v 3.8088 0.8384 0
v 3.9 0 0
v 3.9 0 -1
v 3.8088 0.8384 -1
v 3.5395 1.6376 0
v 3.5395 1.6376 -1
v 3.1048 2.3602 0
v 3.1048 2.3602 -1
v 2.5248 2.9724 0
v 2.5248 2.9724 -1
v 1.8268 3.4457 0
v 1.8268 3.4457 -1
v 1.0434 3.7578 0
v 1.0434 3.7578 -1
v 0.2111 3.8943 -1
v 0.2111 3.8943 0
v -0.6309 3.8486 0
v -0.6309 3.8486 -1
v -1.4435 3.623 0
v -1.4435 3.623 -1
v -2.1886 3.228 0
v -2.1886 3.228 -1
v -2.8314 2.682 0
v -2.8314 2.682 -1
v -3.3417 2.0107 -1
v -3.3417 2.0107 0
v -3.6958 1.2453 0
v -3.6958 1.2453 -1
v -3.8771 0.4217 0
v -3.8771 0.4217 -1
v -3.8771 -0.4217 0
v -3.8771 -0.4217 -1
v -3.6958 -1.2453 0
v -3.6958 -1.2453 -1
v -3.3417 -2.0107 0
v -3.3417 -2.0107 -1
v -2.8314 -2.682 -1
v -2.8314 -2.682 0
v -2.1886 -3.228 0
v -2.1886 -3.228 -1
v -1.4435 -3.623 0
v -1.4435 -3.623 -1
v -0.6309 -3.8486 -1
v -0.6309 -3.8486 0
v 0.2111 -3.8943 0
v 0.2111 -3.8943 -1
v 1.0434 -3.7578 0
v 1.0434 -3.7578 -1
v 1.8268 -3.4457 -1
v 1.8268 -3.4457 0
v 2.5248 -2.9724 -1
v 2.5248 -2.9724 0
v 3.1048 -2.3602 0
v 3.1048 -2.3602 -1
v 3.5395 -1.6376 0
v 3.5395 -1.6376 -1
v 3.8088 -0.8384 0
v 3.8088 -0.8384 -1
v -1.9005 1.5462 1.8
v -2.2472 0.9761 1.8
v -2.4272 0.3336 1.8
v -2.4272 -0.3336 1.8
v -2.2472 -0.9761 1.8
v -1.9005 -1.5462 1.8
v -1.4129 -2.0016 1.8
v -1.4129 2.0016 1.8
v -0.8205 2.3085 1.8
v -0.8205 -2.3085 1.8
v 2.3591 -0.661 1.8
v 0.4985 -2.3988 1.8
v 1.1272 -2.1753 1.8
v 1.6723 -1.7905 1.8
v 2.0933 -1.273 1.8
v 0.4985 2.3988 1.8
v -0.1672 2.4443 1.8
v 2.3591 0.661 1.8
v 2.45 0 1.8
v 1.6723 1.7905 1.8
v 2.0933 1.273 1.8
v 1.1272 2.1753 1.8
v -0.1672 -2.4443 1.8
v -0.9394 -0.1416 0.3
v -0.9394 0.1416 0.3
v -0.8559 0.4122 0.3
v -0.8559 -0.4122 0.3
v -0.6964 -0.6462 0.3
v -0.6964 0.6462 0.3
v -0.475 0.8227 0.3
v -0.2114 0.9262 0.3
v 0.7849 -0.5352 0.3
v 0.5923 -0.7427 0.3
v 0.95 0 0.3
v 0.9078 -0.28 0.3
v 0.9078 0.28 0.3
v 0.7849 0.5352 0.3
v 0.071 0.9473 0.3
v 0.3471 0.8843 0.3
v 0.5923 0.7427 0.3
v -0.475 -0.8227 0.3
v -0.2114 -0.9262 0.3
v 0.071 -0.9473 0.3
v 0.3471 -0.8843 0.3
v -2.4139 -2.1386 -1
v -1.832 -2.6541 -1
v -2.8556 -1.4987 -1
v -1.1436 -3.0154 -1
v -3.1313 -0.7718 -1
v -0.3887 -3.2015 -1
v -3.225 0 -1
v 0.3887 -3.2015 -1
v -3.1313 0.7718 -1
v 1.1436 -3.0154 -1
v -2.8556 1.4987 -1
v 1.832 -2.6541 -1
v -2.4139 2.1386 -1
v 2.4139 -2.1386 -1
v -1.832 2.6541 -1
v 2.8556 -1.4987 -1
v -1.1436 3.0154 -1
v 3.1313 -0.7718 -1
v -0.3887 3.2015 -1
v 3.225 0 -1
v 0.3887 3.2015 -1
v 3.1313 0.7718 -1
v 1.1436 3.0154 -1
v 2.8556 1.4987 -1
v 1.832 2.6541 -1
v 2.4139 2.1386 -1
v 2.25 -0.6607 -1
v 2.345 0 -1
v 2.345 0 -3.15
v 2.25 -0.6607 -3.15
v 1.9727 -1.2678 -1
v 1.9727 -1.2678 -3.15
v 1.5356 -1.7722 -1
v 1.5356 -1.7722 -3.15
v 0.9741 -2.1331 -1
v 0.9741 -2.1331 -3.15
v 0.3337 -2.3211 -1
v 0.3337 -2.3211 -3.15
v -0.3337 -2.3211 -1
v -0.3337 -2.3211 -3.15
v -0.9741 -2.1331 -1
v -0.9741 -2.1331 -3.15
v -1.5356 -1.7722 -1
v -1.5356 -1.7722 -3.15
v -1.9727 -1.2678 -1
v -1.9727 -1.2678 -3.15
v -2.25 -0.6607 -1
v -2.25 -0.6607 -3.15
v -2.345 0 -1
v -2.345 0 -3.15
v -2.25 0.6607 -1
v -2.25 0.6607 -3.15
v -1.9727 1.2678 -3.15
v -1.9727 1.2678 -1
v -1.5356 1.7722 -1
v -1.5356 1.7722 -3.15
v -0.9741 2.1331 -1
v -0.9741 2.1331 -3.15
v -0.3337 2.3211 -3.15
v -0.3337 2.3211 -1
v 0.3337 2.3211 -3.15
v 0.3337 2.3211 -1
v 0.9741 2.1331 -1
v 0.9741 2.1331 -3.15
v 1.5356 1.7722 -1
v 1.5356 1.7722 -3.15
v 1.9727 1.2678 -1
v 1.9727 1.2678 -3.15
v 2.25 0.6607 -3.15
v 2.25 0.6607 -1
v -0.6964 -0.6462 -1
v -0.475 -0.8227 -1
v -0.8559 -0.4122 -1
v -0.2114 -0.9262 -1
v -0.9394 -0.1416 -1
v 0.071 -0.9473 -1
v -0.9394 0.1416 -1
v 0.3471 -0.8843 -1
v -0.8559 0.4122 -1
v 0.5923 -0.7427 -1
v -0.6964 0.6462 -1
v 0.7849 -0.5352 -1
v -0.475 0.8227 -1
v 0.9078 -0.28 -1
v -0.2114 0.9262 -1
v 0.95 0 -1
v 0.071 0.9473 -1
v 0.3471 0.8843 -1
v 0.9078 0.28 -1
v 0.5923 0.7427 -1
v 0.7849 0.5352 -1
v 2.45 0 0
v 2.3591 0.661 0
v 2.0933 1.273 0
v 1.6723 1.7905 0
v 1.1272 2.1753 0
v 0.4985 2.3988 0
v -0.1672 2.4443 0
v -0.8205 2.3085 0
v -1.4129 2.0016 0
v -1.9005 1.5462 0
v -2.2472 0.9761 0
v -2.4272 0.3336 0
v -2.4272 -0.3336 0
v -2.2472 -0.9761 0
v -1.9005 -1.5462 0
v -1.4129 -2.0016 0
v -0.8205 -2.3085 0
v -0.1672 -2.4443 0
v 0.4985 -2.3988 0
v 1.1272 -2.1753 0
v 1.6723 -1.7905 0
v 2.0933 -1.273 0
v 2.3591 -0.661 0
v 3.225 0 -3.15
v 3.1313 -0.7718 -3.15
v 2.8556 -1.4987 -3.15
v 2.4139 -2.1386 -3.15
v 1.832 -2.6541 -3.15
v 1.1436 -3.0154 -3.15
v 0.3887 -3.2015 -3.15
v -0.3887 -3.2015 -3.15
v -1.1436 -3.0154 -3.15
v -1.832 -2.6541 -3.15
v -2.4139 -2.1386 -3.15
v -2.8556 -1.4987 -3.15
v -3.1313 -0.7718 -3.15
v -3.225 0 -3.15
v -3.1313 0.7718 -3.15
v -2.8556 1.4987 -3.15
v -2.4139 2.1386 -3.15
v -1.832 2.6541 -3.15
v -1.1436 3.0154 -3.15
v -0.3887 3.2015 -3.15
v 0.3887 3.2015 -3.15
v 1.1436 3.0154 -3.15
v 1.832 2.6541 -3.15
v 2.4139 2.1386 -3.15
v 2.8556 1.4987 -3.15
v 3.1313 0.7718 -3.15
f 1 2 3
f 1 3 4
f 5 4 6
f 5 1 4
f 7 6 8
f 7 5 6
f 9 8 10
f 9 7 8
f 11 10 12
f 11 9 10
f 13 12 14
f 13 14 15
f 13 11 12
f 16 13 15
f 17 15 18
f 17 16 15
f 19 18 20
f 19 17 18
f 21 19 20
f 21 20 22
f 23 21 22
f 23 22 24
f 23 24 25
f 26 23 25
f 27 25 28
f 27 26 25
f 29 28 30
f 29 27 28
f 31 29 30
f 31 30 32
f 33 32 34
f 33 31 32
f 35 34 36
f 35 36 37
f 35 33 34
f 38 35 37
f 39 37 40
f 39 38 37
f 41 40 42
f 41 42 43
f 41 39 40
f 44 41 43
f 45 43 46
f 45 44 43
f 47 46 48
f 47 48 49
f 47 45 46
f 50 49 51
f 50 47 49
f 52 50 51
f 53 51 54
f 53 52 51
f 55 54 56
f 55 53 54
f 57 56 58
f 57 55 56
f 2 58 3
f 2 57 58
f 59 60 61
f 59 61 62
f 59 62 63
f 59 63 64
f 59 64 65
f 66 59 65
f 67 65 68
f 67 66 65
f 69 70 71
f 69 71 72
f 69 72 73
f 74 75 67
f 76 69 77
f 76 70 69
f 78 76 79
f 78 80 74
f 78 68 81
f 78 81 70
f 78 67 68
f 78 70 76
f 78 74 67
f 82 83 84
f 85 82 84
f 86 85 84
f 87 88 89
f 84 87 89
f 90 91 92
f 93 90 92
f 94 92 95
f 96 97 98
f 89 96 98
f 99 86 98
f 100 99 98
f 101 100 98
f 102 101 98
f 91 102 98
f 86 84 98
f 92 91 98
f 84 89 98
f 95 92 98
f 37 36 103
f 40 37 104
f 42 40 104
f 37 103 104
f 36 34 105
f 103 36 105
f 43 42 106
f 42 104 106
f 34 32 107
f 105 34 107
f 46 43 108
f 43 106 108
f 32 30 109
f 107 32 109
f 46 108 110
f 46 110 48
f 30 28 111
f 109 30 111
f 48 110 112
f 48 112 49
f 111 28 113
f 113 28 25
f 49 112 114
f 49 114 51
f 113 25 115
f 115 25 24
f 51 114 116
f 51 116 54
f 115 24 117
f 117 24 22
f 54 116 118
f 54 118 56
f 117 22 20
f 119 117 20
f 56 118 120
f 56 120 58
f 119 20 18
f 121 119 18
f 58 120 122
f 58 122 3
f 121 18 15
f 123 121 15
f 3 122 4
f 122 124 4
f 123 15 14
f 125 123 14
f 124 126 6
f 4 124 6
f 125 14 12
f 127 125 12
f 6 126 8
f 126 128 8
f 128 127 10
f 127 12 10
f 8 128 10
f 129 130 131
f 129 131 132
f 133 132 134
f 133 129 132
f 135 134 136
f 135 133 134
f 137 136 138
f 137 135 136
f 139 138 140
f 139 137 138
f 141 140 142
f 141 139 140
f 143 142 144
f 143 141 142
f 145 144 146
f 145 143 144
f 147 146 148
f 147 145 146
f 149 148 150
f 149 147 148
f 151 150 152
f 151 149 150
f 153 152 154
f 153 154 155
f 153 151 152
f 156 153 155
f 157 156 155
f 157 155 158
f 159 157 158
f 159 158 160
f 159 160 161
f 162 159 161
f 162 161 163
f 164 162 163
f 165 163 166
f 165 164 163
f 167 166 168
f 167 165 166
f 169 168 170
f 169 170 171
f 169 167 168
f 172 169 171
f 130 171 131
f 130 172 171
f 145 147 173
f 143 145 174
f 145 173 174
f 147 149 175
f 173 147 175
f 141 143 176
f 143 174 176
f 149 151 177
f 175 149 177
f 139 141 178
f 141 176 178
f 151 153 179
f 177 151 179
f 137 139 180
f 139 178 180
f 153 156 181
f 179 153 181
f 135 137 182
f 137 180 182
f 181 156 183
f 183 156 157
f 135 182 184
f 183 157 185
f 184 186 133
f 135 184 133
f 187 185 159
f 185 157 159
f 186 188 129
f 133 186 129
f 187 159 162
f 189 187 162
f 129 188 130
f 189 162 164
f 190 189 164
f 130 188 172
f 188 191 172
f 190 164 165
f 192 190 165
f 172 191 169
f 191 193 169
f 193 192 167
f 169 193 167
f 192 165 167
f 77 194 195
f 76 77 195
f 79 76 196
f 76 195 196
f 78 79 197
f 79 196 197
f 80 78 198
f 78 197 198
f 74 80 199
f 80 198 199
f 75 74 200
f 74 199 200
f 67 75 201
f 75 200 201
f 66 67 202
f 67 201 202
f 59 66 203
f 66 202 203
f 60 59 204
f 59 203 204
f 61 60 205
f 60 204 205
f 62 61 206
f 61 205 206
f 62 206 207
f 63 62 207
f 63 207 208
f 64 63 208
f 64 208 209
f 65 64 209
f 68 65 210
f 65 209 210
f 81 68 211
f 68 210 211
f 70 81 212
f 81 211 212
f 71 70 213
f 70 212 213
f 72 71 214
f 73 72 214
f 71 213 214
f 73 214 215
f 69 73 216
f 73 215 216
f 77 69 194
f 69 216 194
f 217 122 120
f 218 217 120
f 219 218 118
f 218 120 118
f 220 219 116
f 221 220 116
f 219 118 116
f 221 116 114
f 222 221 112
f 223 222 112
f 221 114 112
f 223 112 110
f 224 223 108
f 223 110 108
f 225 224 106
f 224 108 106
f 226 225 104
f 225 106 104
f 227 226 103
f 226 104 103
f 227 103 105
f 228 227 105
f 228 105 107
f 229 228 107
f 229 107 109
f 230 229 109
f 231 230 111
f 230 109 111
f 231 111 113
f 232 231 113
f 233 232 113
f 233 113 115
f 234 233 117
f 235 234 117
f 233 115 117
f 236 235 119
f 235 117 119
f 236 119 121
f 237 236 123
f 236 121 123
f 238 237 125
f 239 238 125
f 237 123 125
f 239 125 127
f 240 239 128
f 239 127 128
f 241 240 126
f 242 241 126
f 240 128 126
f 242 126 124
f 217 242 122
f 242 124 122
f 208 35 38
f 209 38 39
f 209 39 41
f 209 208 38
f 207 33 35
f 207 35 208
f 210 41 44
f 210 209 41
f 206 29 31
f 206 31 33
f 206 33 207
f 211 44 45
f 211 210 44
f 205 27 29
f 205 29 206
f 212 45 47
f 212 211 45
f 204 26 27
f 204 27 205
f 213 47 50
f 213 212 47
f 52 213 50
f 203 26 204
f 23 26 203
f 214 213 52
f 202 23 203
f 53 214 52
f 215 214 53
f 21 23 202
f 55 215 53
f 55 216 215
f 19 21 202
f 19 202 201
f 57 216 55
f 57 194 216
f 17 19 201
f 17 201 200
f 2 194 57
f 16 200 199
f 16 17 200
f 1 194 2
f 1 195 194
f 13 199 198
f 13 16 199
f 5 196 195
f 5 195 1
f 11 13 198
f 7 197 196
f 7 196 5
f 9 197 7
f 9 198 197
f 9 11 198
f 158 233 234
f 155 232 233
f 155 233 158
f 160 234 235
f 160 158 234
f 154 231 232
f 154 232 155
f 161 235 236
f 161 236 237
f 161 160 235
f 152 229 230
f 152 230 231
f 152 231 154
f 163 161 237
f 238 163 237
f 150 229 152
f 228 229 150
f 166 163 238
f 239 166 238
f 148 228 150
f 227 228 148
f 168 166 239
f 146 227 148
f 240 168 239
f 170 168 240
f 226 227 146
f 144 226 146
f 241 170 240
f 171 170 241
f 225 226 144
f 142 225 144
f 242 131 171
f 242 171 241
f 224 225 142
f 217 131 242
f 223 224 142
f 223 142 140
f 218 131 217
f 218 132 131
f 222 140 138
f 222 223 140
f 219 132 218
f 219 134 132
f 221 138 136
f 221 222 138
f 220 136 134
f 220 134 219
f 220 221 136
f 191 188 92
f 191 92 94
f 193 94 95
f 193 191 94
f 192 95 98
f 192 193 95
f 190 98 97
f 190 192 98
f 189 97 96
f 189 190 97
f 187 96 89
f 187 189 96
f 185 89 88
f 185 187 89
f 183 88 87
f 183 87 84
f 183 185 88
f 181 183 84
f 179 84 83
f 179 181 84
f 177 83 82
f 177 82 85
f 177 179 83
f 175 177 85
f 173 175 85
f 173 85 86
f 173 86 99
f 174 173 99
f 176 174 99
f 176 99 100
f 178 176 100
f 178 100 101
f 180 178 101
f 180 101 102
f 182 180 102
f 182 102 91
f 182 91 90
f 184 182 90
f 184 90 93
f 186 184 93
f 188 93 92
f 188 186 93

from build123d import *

# Parameters (mm, degrees)
SKETCH1_R           = 3.9
BOSS_EXTRUDE1_DEPTH = 1
SKETCH2_R           = 2.45
BOSS_EXTRUDE2_DEPTH = 1.8
SHELL1_START        = -1
SHELL1_OUTLINE_R    = 0.95
SHELL1_DEPTH        = 1.3
SKETCH3_R           = 3.225
SKETCH3_R_2         = 2.345
BOSS_EXTRUDE3_DEPTH = 2.15


# Read off the part's stored shape, not the designer's step: Shell1
with BuildPart() as part:
    # Sketch1 → Boss-Extrude1 (new body)
    with BuildSketch(Plane.XY):
        Circle(SKETCH1_R)
    extrude(amount=-BOSS_EXTRUDE1_DEPTH)

    # Sketch2 → Boss-Extrude2 (add)
    with BuildSketch(Plane.XY):
        Circle(SKETCH2_R)
    extrude(amount=BOSS_EXTRUDE2_DEPTH)

    # Shell1 outline → Shell1 (cut)
    with BuildSketch(Plane.XY.offset(SHELL1_START)):
        Circle(SHELL1_OUTLINE_R)
    extrude(amount=SHELL1_DEPTH, mode=Mode.SUBTRACT)

    # Sketch3 → Boss-Extrude3 (add)
    with BuildSketch(Plane(origin=(0, 0, -1), x_dir=(-1, 0, 0), z_dir=(0, 0, -1))):
        with Locations(Location((0, 0, 0), (0, 0, 180))):
            Circle(SKETCH3_R)
        with Locations(Location((0, 0, 0), (0, 0, 180))):
            Circle(SKETCH3_R_2, mode=Mode.SUBTRACT)
    extrude(amount=BOSS_EXTRUDE3_DEPTH)


solid = part.part
